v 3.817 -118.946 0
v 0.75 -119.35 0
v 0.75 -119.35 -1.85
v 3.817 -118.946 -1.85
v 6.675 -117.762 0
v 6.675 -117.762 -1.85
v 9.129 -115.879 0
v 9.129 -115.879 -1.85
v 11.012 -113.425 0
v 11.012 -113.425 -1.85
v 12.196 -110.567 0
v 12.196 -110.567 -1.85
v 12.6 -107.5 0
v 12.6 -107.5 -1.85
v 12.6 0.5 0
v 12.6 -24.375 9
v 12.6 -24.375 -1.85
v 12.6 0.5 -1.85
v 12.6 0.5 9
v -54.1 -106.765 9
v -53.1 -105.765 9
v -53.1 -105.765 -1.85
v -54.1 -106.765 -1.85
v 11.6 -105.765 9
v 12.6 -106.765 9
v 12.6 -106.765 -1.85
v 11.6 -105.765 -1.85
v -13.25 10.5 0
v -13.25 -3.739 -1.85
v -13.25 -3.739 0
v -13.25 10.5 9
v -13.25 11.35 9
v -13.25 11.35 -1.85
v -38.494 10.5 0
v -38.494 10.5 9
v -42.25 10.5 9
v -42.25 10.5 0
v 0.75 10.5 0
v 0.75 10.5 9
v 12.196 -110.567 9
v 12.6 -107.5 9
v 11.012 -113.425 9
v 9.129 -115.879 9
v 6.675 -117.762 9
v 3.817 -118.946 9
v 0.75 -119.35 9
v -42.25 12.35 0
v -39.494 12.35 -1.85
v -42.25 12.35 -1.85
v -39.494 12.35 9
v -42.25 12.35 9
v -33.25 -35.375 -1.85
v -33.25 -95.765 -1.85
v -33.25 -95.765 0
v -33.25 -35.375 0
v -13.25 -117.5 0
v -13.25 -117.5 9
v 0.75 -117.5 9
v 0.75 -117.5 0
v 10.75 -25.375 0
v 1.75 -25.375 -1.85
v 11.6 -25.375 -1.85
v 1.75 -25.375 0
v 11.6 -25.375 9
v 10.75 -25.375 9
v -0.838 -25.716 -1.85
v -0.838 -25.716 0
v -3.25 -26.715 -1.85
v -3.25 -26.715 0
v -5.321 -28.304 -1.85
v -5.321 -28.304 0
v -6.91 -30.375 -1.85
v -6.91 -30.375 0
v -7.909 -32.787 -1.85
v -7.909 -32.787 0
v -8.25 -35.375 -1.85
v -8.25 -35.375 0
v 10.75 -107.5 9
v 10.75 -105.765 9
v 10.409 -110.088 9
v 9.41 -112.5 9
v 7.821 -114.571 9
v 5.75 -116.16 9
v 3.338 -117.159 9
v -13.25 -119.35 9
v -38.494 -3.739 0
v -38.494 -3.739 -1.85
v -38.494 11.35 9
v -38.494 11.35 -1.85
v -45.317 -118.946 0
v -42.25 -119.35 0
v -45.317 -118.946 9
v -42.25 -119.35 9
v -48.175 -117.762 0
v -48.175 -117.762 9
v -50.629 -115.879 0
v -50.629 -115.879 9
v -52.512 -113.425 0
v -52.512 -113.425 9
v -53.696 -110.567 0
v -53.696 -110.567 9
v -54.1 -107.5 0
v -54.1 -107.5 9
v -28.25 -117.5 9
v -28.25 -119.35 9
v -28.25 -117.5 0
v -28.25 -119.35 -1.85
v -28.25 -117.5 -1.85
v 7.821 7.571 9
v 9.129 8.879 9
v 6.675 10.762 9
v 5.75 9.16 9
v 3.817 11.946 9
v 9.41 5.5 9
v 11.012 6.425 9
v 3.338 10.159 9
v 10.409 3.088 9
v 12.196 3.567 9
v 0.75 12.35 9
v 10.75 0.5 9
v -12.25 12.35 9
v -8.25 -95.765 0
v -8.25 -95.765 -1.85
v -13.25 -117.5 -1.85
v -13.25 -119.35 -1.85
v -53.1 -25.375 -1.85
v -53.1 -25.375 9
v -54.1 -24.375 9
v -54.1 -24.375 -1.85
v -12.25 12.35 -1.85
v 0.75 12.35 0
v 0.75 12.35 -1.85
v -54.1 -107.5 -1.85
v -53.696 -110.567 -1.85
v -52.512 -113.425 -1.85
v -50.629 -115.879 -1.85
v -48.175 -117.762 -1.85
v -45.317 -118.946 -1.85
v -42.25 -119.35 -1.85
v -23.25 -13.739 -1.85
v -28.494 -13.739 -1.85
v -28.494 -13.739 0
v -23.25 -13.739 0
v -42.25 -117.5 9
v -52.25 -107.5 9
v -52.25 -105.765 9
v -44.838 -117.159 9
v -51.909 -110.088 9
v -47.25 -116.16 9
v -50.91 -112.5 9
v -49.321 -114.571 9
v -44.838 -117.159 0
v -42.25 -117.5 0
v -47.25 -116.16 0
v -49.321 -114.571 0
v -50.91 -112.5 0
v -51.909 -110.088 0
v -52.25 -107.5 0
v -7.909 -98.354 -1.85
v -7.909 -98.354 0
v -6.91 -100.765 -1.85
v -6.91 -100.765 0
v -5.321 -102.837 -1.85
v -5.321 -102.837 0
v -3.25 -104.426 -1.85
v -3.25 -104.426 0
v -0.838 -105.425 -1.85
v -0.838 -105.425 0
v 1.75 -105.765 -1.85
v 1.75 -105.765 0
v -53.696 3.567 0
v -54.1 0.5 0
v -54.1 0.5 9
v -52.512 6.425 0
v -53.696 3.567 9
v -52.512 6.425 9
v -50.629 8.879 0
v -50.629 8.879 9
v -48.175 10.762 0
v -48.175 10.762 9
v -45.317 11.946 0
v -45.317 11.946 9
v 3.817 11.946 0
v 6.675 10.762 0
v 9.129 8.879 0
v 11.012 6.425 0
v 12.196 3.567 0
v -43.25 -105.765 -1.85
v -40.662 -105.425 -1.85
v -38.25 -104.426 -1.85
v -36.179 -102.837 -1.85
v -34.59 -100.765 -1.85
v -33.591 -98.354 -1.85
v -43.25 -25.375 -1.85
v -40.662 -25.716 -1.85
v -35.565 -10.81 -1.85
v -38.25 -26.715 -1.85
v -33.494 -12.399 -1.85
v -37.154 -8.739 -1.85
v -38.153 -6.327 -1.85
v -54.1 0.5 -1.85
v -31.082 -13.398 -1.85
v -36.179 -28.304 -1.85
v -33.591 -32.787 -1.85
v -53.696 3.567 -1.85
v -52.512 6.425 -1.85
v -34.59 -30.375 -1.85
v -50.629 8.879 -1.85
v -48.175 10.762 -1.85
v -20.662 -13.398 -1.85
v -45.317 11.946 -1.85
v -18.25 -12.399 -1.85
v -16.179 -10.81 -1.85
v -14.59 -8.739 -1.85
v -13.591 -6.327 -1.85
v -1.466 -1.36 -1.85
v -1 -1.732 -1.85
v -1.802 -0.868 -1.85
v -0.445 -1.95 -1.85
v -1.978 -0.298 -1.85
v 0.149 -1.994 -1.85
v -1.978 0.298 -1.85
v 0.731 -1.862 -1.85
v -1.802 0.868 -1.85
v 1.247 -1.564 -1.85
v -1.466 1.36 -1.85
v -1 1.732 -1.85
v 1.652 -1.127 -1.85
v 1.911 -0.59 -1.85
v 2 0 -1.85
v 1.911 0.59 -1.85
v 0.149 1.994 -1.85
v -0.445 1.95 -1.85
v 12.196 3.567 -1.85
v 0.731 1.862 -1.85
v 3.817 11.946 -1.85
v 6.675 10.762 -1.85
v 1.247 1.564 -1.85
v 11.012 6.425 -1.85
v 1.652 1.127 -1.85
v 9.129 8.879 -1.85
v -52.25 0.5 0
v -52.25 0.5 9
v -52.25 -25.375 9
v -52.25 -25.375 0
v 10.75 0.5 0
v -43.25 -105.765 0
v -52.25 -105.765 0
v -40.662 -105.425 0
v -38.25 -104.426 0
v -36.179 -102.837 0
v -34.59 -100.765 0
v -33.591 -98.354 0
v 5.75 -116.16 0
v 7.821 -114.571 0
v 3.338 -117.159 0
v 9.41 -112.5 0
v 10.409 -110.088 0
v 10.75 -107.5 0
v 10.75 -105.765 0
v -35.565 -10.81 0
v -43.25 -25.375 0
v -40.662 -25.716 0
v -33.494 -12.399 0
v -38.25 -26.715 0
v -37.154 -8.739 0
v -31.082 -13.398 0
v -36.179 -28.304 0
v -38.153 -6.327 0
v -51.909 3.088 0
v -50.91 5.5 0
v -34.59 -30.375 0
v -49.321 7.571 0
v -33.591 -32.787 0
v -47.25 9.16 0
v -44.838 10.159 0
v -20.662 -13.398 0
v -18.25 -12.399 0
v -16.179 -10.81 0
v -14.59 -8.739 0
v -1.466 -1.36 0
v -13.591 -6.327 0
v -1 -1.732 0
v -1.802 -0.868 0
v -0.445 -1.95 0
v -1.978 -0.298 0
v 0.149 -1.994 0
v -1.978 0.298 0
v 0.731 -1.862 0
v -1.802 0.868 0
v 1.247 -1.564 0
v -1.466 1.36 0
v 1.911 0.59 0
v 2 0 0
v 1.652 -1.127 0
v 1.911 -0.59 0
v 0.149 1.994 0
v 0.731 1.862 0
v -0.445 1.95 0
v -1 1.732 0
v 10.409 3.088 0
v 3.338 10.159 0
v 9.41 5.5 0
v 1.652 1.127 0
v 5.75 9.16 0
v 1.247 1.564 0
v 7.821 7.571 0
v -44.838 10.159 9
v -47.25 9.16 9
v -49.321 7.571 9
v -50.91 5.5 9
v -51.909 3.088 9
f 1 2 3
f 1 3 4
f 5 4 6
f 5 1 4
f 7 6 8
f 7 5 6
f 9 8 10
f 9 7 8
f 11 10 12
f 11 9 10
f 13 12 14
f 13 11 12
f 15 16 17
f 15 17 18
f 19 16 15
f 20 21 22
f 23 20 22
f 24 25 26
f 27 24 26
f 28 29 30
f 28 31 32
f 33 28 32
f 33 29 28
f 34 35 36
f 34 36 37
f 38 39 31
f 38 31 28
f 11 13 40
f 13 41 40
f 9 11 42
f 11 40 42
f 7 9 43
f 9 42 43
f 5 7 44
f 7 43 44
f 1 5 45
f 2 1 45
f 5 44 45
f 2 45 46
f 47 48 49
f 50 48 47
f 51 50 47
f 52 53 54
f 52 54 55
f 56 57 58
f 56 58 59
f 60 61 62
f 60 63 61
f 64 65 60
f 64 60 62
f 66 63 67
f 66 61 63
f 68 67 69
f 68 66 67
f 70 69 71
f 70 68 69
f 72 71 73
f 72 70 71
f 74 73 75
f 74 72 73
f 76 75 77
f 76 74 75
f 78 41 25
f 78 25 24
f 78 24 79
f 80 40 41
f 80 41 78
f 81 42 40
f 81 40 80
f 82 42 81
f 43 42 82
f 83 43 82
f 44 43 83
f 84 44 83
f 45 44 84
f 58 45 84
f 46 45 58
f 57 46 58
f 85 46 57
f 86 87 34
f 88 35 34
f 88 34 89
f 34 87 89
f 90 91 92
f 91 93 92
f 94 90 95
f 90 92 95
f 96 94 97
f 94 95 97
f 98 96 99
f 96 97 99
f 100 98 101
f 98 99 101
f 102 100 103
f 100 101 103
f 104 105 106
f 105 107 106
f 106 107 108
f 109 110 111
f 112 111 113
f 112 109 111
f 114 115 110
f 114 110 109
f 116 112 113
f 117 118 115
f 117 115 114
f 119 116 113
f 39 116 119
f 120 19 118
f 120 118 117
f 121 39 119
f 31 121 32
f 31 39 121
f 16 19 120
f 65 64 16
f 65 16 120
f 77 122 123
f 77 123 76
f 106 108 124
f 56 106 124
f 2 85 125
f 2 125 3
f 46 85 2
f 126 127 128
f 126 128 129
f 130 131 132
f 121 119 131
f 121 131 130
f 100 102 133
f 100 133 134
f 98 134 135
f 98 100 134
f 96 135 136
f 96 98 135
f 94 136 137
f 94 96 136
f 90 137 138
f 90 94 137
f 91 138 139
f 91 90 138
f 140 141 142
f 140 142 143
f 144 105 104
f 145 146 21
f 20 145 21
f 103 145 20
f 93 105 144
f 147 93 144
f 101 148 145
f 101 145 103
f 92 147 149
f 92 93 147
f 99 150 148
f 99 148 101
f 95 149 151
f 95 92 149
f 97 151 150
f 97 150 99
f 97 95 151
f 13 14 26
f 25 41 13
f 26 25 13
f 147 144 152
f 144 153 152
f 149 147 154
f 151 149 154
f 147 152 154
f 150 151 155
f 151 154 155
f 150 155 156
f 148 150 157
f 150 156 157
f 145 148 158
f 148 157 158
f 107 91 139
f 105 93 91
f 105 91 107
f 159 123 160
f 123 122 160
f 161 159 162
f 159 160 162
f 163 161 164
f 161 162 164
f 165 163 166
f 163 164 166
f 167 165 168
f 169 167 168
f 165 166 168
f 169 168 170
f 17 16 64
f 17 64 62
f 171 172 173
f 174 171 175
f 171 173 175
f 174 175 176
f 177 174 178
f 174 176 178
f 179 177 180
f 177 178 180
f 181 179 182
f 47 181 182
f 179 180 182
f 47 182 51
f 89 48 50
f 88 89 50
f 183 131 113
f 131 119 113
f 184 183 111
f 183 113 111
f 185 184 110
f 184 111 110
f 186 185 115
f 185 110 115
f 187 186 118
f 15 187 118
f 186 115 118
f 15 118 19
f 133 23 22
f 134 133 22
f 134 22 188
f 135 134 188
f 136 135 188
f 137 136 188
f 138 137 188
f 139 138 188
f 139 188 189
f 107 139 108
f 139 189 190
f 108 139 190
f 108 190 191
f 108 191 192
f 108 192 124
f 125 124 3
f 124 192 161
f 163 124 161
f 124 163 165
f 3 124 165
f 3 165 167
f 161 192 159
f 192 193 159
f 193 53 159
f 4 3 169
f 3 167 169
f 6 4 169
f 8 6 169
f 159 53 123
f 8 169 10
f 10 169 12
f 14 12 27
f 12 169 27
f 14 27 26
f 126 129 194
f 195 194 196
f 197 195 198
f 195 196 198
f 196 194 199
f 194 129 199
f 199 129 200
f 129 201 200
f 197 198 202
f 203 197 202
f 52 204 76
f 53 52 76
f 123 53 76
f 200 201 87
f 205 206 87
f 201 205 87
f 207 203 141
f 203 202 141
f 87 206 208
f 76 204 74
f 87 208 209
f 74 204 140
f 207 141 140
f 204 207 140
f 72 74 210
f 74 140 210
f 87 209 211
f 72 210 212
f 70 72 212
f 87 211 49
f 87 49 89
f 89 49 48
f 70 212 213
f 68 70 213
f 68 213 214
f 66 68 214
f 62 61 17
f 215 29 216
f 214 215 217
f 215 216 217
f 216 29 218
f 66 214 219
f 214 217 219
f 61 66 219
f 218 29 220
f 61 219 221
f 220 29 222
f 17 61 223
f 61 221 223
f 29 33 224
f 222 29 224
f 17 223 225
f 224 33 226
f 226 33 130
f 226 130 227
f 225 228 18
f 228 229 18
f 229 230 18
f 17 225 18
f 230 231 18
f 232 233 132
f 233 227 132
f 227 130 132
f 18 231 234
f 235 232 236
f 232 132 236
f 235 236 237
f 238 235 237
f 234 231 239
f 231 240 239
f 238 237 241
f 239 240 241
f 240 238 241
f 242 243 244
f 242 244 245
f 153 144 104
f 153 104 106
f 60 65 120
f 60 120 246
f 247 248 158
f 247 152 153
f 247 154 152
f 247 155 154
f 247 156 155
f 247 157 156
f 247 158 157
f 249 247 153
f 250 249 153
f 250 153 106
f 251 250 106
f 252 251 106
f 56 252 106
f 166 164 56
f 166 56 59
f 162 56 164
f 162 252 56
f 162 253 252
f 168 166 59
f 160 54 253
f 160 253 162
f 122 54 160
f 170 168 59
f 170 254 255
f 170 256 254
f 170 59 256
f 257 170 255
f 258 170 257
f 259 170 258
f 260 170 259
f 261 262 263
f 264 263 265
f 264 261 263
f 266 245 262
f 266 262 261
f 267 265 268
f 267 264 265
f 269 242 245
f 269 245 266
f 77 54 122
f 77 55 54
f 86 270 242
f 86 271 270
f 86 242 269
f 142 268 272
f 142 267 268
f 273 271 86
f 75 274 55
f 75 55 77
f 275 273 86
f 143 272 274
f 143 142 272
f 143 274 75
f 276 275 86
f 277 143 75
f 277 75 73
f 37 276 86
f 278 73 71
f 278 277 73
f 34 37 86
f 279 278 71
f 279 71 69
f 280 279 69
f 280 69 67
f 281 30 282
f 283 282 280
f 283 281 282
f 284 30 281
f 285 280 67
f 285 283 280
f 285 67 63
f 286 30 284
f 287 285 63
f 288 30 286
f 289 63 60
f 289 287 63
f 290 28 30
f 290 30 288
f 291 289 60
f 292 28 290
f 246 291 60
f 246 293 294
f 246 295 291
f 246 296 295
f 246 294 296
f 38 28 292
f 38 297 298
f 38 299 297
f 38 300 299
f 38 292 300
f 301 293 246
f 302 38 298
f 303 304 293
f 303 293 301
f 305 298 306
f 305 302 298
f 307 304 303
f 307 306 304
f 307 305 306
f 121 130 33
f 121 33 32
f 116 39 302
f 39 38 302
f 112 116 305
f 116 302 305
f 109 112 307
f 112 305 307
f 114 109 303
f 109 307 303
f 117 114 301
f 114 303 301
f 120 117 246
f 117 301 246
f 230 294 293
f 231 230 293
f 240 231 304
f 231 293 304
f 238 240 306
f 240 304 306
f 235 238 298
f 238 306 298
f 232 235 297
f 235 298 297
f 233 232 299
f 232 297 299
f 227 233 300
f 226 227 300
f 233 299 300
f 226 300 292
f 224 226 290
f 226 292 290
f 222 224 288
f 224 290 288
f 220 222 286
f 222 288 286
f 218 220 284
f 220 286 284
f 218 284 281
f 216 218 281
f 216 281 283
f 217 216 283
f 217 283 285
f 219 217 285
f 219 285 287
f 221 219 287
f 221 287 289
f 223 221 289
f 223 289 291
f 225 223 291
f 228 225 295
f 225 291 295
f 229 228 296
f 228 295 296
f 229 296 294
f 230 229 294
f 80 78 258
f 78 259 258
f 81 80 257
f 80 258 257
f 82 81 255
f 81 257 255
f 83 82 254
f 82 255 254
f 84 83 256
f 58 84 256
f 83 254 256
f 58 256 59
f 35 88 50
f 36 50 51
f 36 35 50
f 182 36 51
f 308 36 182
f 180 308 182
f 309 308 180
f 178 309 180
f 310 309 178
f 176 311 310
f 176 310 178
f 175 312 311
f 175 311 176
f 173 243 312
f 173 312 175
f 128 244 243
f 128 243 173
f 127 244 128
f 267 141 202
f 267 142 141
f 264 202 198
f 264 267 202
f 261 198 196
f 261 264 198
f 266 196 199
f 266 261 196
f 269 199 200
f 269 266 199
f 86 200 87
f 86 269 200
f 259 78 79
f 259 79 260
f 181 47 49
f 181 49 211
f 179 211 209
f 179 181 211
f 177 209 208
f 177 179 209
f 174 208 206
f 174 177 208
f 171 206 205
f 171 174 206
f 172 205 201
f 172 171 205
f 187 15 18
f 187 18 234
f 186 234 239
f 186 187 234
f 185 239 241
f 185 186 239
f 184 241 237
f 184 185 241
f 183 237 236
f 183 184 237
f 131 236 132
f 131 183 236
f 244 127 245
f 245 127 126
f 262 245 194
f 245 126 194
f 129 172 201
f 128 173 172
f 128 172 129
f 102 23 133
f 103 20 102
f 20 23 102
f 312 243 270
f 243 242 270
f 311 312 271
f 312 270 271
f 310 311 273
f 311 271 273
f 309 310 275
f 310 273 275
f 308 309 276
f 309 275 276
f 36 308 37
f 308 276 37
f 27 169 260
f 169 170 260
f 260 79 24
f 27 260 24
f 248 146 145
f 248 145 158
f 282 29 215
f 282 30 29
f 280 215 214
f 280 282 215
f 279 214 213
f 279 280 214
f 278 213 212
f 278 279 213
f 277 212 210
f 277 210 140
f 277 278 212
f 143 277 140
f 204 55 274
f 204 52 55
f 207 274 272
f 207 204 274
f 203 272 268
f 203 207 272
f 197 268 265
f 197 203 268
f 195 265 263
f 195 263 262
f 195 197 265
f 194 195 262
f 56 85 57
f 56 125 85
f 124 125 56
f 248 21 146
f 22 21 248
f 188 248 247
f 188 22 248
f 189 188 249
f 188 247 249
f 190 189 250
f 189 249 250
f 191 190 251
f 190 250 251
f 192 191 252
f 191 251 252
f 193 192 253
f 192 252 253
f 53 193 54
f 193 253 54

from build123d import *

# Parameters (mm, degrees)
F3_W     = 1.85
F3_H     = 9
F1_R     = 2
F5_DEPTH = 1.85
F6_W     = 25.2441216726
F6_H     = 31.736315228
F6_W_2   = 15
F6_H_2   = 17.6660341024
F6_W_3   = 32.0804953698
F6_H_3   = 80.390445888
F6_W_4   = 30.8194325197
F7_DEPTH = 25
F8_R     = 10
F9_SIZE  = 1


with BuildPart() as f4:
    # F4: sweep along a path in F1
    with BuildLine(Plane.XY) as f4_path:
        Line((10.75, 0.5), (10.75, -107.5))
        ThreePointArc((10.75, -107.5), (7.8210678119, -114.5710678119), (0.75, -117.5))
        Line((0.75, -117.5), (-42.25, -117.5))
        ThreePointArc((-42.25, -117.5), (-49.3210678119, -114.5710678119), (-52.25, -107.5))
        Line((-52.25, -107.5), (-52.25, 0.5))
        ThreePointArc((-52.25, 0.5), (-49.3210678119, 7.5710678119), (-42.25, 10.5))
        Line((-42.25, 10.5), (0.75, 10.5))
        ThreePointArc((0.75, 10.5), (7.8210678119, 7.5710678119), (10.75, 0.5))
    # F3 (on line) → F4 (sweep)
    with BuildSketch(Plane.XZ.offset(53.5)):
        with Locations((11.675, 4.5)):
            Rectangle(F3_W, F3_H)
    sweep(path=f4_path.line)

    # F1 (on Top) → F5 (join)
    with BuildSketch(Plane.XY):
        with BuildLine():
            Line((0.75, 12.35), (-42.25, 12.35))
            ThreePointArc((-42.25, 12.35), (-50.6292153571, 8.8792153571), (-54.1, 0.5))
            Line((-54.1, 0.5), (-54.1, -107.5))
            ThreePointArc((-54.1, -107.5), (-50.6292153571, -115.8792153571), (-42.25, -119.35))
            Line((-42.25, -119.35), (0.75, -119.35))
            ThreePointArc((0.75, -119.35), (9.1292153571, -115.8792153571), (12.6, -107.5))
            Line((12.6, -107.5), (12.6, 0.5))
            ThreePointArc((12.6, 0.5), (9.1292153571, 8.8792153571), (0.75, 12.35))
        make_face()
        with BuildLine():
            Line((-42.25, 10.5), (0.75, 10.5))
            ThreePointArc((0.75, 10.5), (7.8210678119, 7.5710678119), (10.75, 0.5))
            Line((10.75, 0.5), (10.75, -107.5))
            ThreePointArc((10.75, -107.5), (7.8210678119, -114.5710678119), (0.75, -117.5))
            Line((0.75, -117.5), (-42.25, -117.5))
            ThreePointArc((-42.25, -117.5), (-49.3210678119, -114.5710678119), (-52.25, -107.5))
            Line((-52.25, -107.5), (-52.25, 0.5))
            ThreePointArc((-52.25, 0.5), (-49.3210678119, 7.5710678119), (-42.25, 10.5))
        make_face(mode=Mode.SUBTRACT)
        with BuildLine():
            ThreePointArc((10.75, 0.5), (7.8210678119, 7.5710678119), (0.75, 10.5))
            Line((0.75, 10.5), (-42.25, 10.5))
            ThreePointArc((-42.25, 10.5), (-49.3210678119, 7.5710678119), (-52.25, 0.5))
            Line((-52.25, 0.5), (-52.25, -107.5))
            ThreePointArc((-52.25, -107.5), (-49.3210678119, -114.5710678119), (-42.25, -117.5))
            Line((-42.25, -117.5), (0.75, -117.5))
            ThreePointArc((0.75, -117.5), (7.8210678119, -114.5710678119), (10.75, -107.5))
            Line((10.75, -107.5), (10.75, 0.5))
        make_face()
        Circle(F1_R, mode=Mode.SUBTRACT)
    extrude(amount=-F5_DEPTH)

    # F6 (on Top) → F7 (cut, symmetric)
    with BuildSketch(Plane.XY):
        with Locations((-25.8720608363, 2.1293233149)):
            Rectangle(F6_W, F6_H)
        with Locations((-20.75, -126.3330170512)):
            Rectangle(F6_W_2, F6_H_2)
        with Locations((-49.2902476849, -65.5702464283)):
            Rectangle(F6_W_3, F6_H_3)
        with Locations((7.1597162599, -65.5702464283)):
            Rectangle(F6_W_4, F6_H_3)
    extrude(amount=F7_DEPTH, both=True, mode=Mode.SUBTRACT)

    # F8
    f8_edges = [f4.edges().sort_by_distance(p)[0] for p in [
        (-33.25, -25.375023, -0.925),
        (-8.25, -25.375023, -0.925),
        (-8.25, -105.765469, -0.925),
        (-33.25, -105.765469, -0.925),
        (-38.494122, -13.738834, -0.925),
        (-13.25, -13.738834, -0.925),
    ]]
    fillet(f8_edges, radius=F8_R)

    # F9
    f9_edges = [f4.edges().sort_by_distance(p)[0] for p in [
        (-54.1, -25.375023, 3.575),
        (12.6, -25.375023, 3.575),
        (-13.25, 12.35, 3.575),
        (-38.494122, 12.35, 3.575),
        (-54.1, -105.765469, 3.575),
        (12.6, -105.765469, 3.575),
    ]]
    chamfer(f9_edges, length=F9_SIZE)


solid = f4.part
